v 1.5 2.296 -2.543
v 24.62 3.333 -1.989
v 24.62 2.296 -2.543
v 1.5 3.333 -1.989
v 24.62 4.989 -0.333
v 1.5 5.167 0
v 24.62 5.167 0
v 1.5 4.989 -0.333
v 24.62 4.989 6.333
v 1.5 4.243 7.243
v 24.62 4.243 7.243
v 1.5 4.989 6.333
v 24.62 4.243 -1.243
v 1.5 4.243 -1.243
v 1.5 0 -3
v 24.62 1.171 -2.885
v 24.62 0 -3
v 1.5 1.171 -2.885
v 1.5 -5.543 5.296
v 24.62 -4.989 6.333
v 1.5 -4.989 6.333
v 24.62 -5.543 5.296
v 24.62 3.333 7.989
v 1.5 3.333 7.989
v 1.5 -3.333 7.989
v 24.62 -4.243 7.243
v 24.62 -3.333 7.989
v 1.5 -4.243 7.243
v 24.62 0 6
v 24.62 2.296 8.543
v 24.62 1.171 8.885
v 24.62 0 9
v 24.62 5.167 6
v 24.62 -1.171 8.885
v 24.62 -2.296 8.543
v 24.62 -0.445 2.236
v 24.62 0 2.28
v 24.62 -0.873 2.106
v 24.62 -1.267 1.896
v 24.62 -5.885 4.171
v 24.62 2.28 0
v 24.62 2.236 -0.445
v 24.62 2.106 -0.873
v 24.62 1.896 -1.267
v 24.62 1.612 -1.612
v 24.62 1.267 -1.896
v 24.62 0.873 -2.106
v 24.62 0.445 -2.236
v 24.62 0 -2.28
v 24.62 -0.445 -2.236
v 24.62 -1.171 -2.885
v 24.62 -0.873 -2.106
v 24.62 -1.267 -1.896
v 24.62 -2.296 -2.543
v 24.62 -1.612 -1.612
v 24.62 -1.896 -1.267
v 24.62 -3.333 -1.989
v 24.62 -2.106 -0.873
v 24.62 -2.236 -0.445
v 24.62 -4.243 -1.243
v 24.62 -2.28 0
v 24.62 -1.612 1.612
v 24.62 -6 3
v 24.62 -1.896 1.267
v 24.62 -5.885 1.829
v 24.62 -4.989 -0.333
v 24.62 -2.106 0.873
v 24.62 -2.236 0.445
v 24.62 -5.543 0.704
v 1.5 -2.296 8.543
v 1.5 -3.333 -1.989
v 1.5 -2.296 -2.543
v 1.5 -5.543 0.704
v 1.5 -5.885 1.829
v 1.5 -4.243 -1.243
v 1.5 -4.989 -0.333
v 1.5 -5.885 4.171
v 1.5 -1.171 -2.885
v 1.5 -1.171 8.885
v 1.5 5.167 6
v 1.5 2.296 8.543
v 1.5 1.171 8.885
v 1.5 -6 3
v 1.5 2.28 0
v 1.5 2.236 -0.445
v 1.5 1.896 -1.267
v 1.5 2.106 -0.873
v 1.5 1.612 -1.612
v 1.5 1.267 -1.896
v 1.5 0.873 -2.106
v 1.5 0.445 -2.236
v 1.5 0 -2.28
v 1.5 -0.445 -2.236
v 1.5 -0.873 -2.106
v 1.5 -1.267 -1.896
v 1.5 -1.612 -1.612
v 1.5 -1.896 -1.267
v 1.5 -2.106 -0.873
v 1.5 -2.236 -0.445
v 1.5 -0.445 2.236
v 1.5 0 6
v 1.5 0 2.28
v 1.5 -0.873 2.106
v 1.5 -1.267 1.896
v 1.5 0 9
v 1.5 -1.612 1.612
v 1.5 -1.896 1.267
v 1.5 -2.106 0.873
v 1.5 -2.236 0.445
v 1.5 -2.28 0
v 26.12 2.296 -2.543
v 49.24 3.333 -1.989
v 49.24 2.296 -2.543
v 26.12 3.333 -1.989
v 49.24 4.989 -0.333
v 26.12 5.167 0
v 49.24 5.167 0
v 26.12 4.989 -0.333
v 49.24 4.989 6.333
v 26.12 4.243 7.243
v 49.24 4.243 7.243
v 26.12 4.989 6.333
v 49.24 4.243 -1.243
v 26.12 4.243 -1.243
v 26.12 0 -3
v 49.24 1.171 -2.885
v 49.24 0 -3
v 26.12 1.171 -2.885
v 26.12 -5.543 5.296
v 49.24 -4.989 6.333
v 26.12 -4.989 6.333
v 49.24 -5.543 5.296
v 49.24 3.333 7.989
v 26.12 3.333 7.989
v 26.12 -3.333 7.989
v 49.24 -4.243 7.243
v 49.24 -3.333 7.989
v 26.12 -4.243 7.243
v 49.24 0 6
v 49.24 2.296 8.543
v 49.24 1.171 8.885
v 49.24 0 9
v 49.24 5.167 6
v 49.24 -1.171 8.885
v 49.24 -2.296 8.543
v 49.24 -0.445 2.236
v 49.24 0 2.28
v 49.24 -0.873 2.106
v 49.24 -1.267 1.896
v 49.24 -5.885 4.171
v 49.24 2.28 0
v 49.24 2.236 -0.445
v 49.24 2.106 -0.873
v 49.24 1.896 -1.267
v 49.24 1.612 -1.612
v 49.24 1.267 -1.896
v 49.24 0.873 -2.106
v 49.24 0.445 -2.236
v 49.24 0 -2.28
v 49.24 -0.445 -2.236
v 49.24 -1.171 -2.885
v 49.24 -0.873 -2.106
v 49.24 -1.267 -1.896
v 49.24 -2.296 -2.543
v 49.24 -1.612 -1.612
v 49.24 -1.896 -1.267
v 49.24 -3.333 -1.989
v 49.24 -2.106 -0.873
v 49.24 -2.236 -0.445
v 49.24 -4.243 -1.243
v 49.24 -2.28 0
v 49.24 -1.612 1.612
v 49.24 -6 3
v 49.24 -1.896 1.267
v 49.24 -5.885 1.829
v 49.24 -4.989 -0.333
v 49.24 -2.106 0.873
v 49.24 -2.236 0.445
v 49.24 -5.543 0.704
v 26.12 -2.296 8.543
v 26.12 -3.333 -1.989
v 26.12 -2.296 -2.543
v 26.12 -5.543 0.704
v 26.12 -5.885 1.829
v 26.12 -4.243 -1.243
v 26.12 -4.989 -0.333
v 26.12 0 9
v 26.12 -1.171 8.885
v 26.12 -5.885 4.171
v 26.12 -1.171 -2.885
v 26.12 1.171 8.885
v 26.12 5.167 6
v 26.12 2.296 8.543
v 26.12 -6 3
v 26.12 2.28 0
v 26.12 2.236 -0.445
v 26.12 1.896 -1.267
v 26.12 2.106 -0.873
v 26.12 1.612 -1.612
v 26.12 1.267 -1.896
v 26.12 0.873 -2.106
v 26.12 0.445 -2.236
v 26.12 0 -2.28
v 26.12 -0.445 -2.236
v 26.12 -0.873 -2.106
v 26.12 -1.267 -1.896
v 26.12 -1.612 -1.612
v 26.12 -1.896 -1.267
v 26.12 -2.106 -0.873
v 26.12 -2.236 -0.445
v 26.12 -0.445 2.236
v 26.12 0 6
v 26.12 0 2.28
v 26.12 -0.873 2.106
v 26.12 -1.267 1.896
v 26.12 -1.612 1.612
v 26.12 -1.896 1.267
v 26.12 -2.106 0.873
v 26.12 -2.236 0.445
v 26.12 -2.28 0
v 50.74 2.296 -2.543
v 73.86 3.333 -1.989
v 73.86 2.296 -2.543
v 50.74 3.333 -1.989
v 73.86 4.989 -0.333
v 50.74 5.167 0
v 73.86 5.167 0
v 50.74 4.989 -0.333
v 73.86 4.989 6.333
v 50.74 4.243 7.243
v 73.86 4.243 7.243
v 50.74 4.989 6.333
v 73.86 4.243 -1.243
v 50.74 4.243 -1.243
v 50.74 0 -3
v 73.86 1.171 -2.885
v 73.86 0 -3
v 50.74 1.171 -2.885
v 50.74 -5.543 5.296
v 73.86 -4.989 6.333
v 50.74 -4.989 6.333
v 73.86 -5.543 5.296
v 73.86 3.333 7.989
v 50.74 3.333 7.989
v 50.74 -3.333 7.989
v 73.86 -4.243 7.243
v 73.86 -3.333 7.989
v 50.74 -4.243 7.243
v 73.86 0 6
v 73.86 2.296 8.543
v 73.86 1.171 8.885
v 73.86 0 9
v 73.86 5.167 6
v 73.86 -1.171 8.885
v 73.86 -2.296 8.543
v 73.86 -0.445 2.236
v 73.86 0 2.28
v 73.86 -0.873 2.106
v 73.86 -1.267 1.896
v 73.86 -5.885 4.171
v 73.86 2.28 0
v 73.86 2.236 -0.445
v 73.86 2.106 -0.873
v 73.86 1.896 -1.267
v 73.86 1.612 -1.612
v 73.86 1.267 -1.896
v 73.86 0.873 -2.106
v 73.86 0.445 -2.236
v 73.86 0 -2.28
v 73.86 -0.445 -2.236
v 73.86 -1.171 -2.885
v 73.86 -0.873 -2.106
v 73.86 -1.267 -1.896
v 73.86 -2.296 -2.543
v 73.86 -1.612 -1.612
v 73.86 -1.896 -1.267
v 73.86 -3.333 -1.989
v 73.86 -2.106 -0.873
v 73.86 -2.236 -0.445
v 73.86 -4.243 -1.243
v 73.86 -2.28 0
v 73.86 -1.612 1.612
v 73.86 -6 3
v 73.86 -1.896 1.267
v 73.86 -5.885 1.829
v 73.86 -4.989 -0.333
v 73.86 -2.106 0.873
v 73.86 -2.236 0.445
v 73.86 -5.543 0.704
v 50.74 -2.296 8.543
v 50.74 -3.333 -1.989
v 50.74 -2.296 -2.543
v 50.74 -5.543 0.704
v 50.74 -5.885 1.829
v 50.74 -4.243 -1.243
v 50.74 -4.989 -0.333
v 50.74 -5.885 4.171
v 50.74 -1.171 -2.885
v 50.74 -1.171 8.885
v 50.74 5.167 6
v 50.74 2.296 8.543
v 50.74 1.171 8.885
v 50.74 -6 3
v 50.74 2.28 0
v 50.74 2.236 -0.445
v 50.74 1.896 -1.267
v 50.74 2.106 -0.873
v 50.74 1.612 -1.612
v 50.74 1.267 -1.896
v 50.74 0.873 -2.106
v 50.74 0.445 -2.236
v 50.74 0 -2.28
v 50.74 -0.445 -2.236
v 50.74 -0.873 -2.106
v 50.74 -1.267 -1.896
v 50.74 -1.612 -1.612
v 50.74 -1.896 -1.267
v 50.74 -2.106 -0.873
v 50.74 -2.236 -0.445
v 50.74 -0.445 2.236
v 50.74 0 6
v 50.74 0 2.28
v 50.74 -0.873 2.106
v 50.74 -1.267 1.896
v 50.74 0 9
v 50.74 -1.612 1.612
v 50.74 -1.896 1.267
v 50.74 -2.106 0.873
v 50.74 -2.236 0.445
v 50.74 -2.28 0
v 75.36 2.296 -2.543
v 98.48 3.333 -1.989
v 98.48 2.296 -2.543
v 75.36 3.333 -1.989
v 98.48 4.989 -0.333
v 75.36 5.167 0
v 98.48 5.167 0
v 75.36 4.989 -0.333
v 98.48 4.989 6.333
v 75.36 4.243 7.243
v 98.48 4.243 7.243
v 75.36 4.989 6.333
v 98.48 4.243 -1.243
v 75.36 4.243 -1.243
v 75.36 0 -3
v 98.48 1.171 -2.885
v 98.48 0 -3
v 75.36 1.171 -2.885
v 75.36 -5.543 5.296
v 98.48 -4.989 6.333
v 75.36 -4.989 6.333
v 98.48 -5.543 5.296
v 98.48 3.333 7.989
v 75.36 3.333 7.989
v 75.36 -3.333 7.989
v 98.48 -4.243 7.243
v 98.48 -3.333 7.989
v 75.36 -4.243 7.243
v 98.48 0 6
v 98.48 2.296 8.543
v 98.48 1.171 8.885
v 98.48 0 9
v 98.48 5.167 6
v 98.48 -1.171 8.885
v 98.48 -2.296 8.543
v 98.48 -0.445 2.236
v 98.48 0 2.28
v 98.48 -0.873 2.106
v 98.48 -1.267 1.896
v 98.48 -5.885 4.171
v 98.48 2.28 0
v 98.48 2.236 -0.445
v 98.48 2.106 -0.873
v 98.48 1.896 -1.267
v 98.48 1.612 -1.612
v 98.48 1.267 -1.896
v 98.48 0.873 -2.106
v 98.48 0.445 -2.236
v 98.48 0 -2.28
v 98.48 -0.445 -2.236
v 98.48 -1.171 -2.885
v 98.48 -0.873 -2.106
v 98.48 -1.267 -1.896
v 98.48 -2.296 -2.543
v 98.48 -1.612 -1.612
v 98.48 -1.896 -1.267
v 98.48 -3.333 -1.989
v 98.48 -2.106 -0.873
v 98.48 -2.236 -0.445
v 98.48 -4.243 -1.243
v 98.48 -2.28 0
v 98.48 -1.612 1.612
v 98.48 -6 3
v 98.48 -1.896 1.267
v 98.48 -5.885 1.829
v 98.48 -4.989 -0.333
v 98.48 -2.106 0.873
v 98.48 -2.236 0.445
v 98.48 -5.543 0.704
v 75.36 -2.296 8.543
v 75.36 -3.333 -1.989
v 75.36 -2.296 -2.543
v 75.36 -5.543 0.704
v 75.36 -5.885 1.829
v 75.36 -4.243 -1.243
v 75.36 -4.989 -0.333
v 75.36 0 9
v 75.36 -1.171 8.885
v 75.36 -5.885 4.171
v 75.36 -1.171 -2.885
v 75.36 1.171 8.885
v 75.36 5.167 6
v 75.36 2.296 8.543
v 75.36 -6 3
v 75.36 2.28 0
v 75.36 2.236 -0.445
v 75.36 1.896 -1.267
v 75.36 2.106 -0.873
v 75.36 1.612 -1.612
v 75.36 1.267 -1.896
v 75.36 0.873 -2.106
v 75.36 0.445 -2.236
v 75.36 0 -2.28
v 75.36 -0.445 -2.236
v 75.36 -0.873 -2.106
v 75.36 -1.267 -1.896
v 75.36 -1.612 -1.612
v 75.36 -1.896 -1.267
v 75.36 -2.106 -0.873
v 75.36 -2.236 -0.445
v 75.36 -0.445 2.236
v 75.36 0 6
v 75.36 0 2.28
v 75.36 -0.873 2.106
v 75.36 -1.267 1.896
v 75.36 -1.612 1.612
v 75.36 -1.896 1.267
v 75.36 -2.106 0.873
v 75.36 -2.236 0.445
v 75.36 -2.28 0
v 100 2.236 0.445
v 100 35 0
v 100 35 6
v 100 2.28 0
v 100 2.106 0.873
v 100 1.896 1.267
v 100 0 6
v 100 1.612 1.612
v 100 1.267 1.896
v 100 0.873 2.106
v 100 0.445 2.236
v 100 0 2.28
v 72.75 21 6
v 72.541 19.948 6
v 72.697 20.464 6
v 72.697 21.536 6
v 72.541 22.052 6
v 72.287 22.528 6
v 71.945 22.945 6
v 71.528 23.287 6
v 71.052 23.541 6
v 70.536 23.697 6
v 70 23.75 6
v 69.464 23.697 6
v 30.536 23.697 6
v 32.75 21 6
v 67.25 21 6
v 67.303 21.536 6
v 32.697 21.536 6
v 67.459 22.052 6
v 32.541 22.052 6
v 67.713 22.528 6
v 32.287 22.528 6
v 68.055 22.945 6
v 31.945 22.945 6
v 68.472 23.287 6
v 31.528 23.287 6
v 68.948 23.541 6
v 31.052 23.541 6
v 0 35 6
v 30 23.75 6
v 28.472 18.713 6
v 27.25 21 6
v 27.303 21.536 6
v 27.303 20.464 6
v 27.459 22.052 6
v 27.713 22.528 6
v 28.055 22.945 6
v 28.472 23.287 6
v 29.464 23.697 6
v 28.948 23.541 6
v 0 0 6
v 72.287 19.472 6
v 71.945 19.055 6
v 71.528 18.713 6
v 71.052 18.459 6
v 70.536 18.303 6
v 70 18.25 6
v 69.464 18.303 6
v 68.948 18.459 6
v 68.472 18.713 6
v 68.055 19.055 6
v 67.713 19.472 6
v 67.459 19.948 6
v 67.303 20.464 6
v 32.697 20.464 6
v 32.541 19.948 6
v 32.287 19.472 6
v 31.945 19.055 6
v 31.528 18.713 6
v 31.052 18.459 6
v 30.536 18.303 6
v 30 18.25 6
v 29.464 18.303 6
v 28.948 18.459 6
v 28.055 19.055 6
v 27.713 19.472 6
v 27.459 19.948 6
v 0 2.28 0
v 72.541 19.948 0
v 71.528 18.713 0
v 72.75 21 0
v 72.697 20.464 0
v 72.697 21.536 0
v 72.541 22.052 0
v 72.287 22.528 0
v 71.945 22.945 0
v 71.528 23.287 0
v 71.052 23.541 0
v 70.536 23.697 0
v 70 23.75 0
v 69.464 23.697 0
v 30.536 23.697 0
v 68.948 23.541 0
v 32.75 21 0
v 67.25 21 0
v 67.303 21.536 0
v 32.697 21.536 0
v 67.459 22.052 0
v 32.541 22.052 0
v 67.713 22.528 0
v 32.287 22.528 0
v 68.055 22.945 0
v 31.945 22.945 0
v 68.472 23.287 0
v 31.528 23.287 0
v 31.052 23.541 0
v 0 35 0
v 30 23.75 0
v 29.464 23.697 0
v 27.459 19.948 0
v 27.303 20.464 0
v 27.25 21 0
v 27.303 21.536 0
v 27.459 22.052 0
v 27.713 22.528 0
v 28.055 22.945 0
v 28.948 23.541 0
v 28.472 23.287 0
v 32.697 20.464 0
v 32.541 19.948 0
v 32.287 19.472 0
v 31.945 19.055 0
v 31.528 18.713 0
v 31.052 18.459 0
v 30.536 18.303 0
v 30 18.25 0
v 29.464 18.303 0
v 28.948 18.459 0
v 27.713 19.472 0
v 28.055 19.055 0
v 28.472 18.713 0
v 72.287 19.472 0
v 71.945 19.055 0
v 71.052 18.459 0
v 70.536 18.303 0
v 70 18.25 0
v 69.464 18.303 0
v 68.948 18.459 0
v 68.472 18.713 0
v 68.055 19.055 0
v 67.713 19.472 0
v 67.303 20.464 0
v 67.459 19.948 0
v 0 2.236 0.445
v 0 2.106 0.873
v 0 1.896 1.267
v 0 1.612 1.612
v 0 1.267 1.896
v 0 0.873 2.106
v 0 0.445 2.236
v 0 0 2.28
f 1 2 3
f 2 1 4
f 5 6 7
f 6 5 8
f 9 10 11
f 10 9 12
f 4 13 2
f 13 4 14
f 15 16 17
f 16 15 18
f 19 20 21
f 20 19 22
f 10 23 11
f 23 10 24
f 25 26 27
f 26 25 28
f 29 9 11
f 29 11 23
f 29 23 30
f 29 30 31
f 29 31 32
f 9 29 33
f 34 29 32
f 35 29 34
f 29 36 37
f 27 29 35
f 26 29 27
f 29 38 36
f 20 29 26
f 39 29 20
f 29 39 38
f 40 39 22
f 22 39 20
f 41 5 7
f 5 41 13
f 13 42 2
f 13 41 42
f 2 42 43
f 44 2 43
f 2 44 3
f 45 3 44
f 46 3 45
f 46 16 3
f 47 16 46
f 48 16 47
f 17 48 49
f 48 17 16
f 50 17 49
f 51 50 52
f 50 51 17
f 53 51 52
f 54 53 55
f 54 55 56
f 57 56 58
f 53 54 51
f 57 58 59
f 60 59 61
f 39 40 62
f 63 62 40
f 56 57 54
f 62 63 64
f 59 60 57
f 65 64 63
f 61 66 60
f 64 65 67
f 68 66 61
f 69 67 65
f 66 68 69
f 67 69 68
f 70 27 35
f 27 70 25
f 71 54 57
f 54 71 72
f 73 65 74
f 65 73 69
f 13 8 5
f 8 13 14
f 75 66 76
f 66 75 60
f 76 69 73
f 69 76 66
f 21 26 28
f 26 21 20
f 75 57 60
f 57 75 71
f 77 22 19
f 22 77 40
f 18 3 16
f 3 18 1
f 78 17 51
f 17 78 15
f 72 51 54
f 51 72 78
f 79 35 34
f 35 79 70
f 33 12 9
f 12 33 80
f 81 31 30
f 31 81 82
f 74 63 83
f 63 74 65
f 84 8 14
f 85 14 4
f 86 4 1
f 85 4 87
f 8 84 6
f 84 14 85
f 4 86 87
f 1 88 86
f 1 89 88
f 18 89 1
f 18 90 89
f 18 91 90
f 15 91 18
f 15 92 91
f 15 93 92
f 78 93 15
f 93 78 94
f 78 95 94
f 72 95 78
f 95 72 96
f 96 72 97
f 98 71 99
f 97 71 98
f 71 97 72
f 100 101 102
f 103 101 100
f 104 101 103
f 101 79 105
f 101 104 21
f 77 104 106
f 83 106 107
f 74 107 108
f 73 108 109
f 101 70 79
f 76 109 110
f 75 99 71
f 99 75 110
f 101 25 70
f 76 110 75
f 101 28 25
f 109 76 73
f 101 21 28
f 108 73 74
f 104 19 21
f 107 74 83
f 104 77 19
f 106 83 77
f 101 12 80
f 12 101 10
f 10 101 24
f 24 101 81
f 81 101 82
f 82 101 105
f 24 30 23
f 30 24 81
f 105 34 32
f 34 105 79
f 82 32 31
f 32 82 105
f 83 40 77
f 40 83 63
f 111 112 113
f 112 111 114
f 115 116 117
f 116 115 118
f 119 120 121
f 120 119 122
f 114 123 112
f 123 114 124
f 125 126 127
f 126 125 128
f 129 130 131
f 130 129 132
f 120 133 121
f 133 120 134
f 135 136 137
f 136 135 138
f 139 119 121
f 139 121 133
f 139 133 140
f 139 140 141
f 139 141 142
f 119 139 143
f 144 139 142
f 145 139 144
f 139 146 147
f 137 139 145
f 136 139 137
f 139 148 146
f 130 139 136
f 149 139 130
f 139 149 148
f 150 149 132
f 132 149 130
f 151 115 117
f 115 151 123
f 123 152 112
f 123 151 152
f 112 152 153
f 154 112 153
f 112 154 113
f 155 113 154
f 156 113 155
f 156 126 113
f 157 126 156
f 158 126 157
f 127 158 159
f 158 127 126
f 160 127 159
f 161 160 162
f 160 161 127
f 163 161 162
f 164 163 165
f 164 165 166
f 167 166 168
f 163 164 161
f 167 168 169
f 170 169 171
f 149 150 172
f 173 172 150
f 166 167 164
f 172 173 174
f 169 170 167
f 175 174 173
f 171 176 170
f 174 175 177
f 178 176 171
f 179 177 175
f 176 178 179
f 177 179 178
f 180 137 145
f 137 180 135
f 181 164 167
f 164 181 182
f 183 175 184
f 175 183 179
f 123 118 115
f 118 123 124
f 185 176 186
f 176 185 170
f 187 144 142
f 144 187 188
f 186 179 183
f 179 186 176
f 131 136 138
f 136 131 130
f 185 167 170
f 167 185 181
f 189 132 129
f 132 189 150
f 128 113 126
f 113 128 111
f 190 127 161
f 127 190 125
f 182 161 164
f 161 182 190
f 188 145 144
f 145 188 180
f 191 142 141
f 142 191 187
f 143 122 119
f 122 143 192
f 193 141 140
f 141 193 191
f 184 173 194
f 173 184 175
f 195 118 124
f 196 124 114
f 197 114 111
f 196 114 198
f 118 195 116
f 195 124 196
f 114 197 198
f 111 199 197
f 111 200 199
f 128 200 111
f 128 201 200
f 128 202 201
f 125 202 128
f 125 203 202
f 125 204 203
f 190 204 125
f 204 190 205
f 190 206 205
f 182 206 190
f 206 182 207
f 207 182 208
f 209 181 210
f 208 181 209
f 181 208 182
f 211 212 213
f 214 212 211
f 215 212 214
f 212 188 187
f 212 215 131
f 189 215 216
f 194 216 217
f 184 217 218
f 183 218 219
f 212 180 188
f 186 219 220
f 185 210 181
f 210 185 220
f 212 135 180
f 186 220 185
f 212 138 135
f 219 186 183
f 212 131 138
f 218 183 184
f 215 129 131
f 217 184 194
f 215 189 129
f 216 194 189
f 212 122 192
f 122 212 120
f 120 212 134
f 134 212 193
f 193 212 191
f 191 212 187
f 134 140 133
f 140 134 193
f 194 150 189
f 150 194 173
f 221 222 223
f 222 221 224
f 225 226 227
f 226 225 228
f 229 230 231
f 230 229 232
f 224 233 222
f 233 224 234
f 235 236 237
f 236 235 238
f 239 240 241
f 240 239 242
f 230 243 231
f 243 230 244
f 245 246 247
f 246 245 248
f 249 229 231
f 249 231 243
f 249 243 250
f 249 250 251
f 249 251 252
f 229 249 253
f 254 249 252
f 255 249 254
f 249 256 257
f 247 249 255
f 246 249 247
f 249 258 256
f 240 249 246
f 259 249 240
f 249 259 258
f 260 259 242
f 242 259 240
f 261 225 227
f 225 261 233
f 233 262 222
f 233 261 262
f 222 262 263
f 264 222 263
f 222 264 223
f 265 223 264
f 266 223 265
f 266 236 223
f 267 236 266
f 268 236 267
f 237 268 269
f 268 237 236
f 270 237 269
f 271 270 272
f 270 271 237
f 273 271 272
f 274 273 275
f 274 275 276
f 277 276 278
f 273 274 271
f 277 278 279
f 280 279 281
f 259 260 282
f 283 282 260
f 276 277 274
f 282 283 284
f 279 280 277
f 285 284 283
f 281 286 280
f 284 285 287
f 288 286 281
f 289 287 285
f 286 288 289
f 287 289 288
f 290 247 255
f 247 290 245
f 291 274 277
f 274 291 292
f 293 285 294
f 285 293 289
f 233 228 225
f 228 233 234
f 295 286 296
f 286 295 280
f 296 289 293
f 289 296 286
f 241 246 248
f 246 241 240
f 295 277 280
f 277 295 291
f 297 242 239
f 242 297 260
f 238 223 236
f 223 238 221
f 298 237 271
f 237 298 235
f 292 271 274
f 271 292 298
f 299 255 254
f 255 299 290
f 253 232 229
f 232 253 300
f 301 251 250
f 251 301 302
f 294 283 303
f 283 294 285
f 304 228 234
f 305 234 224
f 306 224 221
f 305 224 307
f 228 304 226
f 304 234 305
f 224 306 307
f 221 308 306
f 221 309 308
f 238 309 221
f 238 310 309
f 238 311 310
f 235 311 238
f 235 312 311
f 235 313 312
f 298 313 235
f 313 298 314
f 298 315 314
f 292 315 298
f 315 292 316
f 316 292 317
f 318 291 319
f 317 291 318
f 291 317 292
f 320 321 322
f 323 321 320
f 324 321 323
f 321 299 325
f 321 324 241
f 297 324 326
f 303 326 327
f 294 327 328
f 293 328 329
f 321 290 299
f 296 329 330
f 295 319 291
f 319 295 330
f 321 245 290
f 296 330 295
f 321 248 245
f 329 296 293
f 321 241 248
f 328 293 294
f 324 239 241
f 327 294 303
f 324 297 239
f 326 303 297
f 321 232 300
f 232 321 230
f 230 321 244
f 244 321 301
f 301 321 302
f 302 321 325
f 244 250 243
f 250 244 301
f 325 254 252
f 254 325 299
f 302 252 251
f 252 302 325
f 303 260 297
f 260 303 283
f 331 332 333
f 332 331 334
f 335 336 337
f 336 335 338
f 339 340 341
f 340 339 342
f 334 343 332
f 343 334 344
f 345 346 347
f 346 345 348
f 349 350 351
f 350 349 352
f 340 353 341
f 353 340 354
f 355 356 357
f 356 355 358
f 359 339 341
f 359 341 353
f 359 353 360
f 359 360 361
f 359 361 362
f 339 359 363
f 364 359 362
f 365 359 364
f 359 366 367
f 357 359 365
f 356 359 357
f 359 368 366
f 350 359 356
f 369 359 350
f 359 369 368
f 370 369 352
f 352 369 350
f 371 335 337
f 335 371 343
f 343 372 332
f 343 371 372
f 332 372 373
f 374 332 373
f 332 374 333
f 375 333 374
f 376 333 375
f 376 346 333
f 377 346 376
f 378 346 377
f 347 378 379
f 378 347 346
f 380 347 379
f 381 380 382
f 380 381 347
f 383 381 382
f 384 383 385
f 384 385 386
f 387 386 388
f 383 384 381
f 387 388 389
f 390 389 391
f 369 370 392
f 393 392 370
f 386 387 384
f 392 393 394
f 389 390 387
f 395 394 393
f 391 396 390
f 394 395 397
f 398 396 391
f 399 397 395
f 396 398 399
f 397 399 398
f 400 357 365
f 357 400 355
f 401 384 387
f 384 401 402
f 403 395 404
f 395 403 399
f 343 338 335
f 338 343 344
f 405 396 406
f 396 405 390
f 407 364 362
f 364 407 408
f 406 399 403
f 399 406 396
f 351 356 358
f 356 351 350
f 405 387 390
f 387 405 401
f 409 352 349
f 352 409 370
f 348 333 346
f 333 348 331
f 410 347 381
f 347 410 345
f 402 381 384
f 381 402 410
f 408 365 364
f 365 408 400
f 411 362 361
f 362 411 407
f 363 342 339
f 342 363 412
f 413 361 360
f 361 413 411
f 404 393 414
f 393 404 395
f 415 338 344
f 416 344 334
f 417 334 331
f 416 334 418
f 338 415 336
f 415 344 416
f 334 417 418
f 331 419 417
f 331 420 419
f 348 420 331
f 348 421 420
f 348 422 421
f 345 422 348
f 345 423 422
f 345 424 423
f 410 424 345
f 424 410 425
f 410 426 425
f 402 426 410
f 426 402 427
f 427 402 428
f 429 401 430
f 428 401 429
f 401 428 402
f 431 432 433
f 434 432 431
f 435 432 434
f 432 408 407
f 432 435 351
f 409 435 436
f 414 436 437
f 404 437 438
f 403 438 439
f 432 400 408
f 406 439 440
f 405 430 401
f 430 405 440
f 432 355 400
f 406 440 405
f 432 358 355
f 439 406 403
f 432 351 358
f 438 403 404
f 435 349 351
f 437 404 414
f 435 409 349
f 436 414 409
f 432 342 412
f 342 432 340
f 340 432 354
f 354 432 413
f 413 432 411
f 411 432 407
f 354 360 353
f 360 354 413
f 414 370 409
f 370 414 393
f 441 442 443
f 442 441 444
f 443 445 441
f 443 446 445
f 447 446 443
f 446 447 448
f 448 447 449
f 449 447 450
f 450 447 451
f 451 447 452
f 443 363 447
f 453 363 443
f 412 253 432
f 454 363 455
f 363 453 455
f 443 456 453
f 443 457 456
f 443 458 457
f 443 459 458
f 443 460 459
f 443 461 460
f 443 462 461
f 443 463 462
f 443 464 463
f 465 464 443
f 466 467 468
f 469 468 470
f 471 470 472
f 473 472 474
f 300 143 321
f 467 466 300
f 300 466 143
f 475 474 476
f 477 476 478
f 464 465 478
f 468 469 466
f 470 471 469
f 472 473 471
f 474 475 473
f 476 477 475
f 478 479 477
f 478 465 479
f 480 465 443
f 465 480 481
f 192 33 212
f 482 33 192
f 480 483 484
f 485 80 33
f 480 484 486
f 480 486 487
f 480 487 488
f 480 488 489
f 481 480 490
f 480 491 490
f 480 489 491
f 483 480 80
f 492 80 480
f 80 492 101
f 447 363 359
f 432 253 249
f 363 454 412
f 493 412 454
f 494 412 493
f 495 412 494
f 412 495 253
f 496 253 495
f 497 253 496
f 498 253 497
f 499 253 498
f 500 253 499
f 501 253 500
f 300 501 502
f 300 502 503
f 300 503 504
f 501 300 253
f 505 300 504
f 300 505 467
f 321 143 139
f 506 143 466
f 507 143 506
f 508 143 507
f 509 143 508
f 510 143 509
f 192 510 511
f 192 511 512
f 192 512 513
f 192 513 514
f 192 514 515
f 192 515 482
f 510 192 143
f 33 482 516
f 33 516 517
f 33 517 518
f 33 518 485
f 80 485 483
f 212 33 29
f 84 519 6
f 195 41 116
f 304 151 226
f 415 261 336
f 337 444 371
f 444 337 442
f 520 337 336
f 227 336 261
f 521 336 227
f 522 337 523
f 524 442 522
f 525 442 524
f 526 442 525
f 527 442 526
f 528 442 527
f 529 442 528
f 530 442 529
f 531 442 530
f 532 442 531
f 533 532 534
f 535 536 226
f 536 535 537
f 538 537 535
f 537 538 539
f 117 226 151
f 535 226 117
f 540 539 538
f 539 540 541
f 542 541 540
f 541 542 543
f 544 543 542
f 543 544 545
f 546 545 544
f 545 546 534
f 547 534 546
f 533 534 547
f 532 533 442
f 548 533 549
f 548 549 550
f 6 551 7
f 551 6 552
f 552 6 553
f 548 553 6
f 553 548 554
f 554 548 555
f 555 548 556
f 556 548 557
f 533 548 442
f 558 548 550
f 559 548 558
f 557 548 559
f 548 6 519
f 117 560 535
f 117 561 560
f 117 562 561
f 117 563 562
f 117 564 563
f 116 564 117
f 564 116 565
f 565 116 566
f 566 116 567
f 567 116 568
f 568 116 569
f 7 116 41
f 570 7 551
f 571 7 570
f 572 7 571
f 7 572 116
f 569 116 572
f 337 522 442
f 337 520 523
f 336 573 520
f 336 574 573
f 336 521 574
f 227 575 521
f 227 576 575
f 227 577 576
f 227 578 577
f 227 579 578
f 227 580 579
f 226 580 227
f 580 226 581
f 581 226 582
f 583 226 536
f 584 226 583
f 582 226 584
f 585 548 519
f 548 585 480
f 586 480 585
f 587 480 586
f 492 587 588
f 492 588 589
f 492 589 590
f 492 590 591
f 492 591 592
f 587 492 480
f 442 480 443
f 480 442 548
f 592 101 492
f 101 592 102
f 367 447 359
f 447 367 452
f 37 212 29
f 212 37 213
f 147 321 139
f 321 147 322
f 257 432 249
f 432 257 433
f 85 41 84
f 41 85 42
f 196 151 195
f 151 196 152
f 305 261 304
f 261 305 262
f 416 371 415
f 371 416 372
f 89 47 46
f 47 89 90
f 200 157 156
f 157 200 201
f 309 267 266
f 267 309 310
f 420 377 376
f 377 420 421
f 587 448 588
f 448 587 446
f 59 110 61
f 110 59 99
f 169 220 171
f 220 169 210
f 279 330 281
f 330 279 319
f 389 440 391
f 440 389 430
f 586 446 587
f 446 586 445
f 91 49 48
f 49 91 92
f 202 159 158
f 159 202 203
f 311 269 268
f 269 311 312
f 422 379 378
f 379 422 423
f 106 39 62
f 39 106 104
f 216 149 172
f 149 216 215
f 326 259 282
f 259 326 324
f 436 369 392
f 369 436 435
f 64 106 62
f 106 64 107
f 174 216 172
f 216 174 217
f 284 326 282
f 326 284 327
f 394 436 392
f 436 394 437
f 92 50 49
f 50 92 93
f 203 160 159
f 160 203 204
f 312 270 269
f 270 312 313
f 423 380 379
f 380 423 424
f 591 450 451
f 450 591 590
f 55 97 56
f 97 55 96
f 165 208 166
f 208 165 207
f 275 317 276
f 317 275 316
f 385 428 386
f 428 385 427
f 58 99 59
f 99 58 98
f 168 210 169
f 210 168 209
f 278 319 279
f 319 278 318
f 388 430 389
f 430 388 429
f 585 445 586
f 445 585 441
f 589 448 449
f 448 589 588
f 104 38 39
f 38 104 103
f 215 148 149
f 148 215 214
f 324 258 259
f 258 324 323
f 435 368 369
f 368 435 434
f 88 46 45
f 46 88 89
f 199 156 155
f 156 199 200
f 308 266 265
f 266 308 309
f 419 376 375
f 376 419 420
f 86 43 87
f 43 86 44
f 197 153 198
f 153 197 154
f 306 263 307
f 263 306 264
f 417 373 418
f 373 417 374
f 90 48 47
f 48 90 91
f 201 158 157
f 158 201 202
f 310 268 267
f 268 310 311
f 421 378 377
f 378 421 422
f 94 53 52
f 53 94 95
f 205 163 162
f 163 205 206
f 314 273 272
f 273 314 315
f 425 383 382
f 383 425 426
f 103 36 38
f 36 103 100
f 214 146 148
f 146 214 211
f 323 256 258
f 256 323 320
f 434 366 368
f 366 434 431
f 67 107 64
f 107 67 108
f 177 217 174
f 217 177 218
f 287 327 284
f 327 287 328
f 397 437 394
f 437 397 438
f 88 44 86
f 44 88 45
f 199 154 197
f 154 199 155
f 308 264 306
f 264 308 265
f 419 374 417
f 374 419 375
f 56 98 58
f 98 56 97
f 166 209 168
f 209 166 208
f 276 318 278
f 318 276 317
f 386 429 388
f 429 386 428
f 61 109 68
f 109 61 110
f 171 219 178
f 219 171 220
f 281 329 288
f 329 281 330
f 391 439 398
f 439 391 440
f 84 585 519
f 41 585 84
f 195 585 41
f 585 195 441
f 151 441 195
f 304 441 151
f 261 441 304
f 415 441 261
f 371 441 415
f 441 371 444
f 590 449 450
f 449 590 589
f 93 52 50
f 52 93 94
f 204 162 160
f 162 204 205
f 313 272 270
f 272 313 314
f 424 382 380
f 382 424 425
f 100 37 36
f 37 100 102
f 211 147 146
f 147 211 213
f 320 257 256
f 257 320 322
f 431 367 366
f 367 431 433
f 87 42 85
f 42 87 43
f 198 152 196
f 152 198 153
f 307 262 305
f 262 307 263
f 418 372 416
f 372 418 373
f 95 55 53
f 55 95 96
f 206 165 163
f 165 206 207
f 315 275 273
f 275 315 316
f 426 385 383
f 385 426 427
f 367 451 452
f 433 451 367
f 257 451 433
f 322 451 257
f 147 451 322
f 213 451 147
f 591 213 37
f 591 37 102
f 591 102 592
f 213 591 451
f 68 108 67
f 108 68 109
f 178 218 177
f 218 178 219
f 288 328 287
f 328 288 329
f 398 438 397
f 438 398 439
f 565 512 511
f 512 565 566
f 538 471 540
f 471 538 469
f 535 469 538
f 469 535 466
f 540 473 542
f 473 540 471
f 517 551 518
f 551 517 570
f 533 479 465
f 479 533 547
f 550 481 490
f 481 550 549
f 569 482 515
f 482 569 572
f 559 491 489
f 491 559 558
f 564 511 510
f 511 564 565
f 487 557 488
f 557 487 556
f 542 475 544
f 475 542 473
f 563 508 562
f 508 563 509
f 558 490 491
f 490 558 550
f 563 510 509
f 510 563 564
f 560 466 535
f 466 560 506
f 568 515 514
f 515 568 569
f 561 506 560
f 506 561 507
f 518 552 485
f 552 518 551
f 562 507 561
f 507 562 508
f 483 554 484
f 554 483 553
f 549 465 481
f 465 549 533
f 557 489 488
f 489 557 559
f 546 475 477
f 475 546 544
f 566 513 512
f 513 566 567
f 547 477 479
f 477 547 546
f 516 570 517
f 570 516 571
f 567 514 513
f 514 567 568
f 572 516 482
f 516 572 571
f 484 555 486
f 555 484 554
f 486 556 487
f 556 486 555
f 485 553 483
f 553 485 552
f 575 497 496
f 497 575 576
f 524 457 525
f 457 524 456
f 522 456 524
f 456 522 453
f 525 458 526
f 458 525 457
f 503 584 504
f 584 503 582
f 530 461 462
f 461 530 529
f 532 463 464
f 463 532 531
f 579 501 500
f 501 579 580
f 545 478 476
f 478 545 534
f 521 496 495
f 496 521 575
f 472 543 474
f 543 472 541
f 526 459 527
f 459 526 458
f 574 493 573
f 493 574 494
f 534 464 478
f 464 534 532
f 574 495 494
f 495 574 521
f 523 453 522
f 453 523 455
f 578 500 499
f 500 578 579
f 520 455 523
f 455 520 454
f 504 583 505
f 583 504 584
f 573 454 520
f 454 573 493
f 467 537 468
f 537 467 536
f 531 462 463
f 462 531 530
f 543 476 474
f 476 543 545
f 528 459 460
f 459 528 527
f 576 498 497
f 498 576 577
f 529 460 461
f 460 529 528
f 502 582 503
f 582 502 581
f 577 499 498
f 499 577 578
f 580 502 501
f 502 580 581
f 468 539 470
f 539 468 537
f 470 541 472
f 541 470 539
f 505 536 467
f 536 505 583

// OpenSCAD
$fn = 32;

// ----------------------------------------------------------------------
// Hinge leaf: 100 x 41 x 12 mm
// ----------------------------------------------------------------------

// --- parameters (mm) ---
leaf_len = 100;           // leaf length, X
leaf_w = 35;              // leaf width, Y
leaf_t = 6;               // leaf thickness
knuckle_d = 12;           // knuckle diameter
knuckle_w = 23.12;        // knuckle width
knuckle_n = 4;            // number of knuckles
pin_d = 4.56;             // pin bore
gap = 1.5;                // gap between the knuckles
screw_d = 5.5;            // screw clearance

module leaf() {
  cube([leaf_len, leaf_w, leaf_t]);
}

module knuckles() {
  /* barrels sit on the leaf edge, the pin axis at half the leaf thickness */
  for (i = [0 : knuckle_n - 1])
    translate([gap + i * (knuckle_w + gap), 0, leaf_t * 0.5])
      rotate([0, 90, 0]) cylinder(h = knuckle_w, d = knuckle_d);
}

difference() {
  union() {
    leaf();
    knuckles();
  }
  rotate([0, 90, 0]) translate([0, 0, -1])
    cylinder(h = leaf_len + 2, d = pin_d);
  translate([30, leaf_w * 0.6, -1]) cylinder(h = leaf_t + 2, d = screw_d);
  translate([70, leaf_w * 0.6, -1]) cylinder(h = leaf_t + 2, d = screw_d);
}
